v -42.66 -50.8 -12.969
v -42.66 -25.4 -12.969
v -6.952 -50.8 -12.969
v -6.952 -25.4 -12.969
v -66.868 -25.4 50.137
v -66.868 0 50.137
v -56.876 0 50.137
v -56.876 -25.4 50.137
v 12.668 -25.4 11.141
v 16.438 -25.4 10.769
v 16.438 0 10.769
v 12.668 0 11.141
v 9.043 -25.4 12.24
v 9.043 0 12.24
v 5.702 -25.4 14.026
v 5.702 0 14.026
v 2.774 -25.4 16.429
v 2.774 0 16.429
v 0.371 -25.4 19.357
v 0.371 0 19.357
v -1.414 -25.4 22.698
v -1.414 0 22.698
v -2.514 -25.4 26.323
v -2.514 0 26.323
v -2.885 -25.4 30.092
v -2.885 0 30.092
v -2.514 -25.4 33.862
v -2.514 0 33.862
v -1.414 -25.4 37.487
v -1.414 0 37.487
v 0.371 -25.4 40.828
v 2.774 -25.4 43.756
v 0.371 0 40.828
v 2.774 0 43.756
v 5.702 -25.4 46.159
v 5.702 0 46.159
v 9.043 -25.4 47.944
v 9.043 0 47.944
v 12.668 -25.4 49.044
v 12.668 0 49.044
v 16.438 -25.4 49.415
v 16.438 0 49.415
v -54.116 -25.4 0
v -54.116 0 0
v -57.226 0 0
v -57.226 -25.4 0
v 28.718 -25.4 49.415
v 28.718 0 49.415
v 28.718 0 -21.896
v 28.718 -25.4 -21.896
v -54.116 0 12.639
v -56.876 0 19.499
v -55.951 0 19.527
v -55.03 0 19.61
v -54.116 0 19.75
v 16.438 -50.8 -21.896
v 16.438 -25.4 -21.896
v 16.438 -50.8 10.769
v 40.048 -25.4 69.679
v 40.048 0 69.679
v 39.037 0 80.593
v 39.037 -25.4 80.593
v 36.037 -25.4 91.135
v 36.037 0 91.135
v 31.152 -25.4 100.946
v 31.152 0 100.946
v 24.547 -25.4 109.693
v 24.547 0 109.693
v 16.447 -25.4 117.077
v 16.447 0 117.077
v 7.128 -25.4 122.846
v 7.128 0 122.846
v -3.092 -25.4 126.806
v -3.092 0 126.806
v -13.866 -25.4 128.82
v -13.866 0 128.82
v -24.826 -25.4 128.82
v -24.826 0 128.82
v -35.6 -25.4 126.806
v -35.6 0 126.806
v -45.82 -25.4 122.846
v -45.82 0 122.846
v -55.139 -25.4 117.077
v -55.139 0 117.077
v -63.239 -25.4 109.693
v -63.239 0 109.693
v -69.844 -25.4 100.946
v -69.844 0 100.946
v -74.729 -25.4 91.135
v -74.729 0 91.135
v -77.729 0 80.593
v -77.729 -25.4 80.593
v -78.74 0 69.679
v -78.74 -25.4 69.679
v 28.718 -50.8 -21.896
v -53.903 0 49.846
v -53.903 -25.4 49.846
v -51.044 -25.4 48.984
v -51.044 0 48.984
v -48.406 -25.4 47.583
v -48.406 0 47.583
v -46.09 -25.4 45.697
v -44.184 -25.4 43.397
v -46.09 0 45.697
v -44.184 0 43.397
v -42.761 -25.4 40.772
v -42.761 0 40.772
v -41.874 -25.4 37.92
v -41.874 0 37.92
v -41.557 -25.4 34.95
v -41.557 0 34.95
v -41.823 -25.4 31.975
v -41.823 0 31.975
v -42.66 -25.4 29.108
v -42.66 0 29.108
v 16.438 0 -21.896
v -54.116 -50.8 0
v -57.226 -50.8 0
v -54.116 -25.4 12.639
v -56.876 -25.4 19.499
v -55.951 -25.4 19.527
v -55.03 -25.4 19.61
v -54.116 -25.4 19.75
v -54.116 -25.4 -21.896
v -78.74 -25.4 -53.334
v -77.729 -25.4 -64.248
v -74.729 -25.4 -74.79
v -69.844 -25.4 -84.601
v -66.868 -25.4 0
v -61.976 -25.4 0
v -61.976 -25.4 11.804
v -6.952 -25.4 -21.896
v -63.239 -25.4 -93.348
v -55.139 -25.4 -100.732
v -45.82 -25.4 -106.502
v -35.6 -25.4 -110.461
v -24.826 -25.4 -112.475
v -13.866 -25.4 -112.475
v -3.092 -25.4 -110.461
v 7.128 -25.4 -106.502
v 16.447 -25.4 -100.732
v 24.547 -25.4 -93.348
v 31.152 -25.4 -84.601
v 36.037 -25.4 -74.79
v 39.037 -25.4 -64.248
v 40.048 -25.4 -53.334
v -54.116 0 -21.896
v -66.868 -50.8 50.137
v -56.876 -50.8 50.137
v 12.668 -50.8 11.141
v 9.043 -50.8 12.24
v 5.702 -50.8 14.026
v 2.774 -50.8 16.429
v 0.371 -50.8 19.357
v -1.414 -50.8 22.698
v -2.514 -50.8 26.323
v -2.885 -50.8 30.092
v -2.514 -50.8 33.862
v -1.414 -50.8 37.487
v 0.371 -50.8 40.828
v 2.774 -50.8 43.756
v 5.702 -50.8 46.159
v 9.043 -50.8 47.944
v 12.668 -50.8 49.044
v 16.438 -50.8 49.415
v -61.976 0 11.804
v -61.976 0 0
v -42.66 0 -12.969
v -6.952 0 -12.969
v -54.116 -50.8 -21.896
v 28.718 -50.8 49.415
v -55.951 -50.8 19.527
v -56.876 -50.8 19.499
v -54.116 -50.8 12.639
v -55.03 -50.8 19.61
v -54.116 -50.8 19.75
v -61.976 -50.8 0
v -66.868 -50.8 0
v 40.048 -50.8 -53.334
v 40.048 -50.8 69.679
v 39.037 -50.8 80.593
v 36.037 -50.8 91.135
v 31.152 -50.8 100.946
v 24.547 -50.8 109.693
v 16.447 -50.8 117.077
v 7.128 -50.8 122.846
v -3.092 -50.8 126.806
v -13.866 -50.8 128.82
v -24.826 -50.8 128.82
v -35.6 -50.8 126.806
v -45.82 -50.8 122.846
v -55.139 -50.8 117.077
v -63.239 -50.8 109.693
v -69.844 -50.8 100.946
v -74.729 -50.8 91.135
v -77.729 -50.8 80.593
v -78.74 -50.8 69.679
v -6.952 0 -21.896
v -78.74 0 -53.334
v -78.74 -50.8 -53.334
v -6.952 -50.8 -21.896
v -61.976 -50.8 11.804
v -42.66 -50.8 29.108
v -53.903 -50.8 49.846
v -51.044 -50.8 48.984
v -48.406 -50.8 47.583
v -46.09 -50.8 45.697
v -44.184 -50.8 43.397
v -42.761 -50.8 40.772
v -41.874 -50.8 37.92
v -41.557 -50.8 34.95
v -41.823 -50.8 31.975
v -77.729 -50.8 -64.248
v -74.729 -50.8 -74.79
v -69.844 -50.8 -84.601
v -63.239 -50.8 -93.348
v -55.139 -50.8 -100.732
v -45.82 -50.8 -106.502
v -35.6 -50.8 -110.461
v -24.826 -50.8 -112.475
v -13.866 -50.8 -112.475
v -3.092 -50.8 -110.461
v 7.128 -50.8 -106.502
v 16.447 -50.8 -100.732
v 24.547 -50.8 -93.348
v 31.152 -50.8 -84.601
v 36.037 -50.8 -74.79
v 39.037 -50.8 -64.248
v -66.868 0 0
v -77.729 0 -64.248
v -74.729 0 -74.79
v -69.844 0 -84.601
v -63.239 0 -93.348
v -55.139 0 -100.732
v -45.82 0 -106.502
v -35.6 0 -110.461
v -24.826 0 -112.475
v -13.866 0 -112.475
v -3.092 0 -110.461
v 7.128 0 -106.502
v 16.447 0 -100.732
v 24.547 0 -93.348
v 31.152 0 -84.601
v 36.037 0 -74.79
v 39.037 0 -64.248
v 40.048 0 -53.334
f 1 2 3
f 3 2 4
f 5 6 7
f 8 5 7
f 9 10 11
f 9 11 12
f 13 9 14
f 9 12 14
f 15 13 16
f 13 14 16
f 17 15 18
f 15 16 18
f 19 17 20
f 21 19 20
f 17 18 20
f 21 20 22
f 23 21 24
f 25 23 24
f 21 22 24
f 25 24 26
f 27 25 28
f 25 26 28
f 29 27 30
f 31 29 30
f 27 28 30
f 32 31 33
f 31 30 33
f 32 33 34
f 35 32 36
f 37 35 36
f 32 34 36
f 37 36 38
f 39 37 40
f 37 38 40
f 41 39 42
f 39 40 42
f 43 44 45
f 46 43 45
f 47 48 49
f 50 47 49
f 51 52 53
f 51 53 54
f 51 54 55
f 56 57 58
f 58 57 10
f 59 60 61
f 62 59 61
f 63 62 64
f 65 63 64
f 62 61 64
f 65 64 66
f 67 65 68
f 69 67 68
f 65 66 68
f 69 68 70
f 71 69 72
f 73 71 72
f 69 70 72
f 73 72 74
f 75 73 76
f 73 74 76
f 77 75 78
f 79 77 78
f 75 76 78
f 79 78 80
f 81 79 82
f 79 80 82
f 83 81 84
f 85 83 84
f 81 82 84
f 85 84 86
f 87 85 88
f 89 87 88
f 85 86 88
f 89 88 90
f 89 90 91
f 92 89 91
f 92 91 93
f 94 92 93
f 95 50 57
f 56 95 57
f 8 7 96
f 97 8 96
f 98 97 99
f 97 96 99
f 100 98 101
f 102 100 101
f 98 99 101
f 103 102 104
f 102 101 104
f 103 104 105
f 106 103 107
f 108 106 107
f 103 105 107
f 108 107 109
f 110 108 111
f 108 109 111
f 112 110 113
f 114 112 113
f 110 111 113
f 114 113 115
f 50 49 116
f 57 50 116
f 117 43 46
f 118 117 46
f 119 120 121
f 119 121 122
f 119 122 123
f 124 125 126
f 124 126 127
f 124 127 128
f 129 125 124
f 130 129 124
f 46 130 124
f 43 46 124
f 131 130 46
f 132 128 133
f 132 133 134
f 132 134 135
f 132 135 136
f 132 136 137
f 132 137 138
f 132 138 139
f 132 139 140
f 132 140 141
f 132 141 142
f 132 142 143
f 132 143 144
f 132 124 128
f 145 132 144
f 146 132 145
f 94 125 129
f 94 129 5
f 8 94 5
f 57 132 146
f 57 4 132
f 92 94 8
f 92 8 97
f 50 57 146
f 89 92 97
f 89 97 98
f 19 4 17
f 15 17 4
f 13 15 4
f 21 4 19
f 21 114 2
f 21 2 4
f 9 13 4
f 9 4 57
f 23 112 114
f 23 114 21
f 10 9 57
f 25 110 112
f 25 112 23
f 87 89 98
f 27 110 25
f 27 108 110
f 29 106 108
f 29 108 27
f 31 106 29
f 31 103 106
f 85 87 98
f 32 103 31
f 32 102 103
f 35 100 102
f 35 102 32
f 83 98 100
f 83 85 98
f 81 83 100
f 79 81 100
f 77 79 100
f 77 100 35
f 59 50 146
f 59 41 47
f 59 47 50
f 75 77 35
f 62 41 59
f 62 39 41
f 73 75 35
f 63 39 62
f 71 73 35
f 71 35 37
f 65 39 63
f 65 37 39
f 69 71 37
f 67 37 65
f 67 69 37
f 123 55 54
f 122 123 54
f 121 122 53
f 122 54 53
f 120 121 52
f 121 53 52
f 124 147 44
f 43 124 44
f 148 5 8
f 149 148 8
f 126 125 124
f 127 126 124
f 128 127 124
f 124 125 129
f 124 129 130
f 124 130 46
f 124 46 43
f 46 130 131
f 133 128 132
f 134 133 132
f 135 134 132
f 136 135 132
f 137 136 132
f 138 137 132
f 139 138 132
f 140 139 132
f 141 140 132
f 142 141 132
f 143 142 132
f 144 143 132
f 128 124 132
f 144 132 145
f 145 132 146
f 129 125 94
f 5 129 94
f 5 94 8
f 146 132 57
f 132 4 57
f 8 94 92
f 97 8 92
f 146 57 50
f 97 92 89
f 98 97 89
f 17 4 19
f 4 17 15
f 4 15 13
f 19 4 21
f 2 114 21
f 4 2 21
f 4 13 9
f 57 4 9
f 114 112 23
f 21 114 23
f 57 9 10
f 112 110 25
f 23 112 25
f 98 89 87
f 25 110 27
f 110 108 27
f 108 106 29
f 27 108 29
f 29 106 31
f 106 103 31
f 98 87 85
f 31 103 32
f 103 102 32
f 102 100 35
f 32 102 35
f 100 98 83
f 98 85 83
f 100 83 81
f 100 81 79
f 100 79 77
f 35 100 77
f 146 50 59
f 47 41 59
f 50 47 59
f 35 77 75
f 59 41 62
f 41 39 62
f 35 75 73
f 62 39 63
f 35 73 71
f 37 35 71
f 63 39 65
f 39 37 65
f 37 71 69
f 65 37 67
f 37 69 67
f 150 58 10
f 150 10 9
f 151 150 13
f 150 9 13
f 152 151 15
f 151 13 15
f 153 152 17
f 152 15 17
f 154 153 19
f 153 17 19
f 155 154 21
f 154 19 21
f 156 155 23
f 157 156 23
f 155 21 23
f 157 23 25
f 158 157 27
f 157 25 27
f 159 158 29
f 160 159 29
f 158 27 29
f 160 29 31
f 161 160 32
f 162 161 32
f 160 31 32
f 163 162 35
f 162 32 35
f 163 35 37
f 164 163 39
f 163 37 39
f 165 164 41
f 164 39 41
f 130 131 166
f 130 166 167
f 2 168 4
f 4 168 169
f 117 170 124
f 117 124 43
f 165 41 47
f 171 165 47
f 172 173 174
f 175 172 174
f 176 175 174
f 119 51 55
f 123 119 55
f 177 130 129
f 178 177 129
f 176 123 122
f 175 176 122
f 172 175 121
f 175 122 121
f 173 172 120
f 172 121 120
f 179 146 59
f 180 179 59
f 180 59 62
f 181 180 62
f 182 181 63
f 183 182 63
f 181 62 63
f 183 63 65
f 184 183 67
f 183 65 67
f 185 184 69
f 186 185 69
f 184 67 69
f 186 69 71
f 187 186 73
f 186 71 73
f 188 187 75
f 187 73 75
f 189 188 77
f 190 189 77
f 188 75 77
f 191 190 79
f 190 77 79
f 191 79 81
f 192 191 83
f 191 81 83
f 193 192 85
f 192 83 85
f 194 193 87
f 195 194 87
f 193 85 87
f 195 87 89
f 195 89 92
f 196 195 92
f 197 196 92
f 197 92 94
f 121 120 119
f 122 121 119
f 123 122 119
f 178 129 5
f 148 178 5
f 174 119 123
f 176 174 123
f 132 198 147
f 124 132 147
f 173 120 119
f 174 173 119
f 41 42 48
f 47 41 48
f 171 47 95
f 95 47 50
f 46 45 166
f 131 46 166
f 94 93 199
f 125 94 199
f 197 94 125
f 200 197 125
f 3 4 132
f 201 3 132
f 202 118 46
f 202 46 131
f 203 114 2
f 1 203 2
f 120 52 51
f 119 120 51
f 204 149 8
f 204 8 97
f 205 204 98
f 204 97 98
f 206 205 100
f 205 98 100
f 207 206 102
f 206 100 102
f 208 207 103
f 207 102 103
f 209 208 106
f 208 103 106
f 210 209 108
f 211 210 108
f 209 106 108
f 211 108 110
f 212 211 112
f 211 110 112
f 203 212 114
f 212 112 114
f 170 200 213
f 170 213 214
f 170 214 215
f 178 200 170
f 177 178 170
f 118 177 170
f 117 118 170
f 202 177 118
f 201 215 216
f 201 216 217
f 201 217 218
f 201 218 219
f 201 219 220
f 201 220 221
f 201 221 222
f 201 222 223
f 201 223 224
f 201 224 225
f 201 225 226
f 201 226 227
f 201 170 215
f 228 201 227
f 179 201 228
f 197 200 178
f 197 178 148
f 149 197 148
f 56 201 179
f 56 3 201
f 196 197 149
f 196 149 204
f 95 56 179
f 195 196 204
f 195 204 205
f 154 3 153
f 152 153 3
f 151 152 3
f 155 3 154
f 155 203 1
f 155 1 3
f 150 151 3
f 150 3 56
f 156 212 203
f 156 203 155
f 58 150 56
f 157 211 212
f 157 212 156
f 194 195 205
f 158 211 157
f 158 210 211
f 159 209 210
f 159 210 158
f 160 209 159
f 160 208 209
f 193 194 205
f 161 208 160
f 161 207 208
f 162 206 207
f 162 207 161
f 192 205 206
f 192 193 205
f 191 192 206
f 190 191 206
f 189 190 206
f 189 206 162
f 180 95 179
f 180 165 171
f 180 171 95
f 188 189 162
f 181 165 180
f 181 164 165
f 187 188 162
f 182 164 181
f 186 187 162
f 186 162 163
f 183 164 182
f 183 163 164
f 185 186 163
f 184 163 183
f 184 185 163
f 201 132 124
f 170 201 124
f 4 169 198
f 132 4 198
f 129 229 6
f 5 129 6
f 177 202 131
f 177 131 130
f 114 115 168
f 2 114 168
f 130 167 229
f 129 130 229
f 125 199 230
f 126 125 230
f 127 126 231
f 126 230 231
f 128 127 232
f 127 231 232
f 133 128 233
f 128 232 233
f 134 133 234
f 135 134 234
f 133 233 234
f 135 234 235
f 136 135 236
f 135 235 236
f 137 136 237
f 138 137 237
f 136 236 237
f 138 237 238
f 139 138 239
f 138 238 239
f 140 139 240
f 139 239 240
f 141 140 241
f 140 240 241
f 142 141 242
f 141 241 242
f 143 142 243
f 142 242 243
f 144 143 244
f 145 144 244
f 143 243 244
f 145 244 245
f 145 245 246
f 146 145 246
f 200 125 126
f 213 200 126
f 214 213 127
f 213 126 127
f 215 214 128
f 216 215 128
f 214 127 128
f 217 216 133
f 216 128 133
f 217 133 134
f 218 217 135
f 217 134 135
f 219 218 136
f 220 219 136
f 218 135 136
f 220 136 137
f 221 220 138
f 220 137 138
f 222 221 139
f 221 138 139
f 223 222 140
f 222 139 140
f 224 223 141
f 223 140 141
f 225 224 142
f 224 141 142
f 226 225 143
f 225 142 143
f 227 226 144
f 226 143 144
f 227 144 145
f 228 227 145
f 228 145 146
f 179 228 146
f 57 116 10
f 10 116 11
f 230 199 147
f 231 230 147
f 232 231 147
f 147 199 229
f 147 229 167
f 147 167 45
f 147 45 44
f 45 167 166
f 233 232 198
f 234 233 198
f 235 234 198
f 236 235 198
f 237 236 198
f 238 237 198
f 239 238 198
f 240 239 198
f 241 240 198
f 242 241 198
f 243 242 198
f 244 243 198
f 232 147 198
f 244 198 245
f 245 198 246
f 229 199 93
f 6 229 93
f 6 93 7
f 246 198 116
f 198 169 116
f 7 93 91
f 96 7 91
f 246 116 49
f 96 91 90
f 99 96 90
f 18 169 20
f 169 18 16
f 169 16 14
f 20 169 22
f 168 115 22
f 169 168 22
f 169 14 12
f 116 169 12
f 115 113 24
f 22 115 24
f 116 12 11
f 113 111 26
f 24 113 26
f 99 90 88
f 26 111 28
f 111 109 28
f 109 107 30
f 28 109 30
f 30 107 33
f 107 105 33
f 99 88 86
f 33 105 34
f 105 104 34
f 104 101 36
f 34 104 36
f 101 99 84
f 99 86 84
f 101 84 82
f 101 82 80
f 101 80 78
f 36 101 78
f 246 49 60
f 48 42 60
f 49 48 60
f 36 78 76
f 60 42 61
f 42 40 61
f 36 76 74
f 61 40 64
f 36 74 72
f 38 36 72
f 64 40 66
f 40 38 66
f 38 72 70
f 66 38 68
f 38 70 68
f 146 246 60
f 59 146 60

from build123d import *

# Parameters (mm, degrees)
F1_DEPTH = 25.4
F2_DEPTH = 25.4


with BuildPart() as f1:
    # F0 (on Front) → F1 (new body)
    with BuildSketch(Plane.XZ):
        with BuildLine():
            ThreePointArc((40.048032999, 69.6791410446), (-19.34594661, 129.0731206536), (-78.739926219, 69.6791410446))
            Line((-78.739926219, 69.6791410446), (-78.739926219, -53.3344708383))
            ThreePointArc((-78.739926219, -53.3344708383), (-19.34594661, -112.7284504473), (40.048032999, -53.3344708383))
            Line((40.048032999, -53.3344708383), (40.048032999, 69.6791410446))
        make_face()
        with BuildLine():
            Line((-54.1156261476, -21.8957141042), (-54.1156261476, 0))
            Line((-54.1156261476, 0), (-57.2257004678, 0))
            Line((-57.2257004678, 0), (-61.9756149655, 11.8043959837))
            Line((-61.9756149655, 11.8043959837), (-61.9756149655, 0))
            Line((-61.9756149655, 0), (-66.8679773808, 0))
            Line((-66.8679773808, 0), (-66.8679773808, 50.137385726))
            Line((-66.8679773808, 50.137385726), (-56.875812501, 50.137385726))
            ThreePointArc((-56.875812501, 50.137385726), (-44.1841953971, 43.3973306341), (-42.660497129, 29.1080398561))
            Line((-42.660497129, 29.1080398561), (-42.660497129, -12.968535535))
            Line((-42.660497129, -12.968535535), (-6.9517805241, -12.968535535))
            Line((-6.9517805241, -12.968535535), (-6.9517805241, -21.8957141042))
            Line((-6.9517805241, -21.8957141042), (-54.1156261476, -21.8957141042))
        make_face(mode=Mode.SUBTRACT)
        with BuildLine():
            ThreePointArc((16.4377391338, 10.7693783939), (-2.8852429241, 30.0923604518), (16.4377391338, 49.4153425097))
            Line((16.4377391338, 49.4153425097), (28.7177674472, 49.4153425097))
            Line((28.7177674472, 49.4153425097), (28.7177674472, -21.8957141042))
            Line((28.7177674472, -21.8957141042), (16.4377391338, -21.8957141042))
            Line((16.4377391338, -21.8957141042), (16.4377391338, 10.7693783939))
        make_face(mode=Mode.SUBTRACT)
    extrude(amount=F1_DEPTH)


with BuildPart() as f1b:
    # F0 (on Front) → F1, piece 2 (new body)
    with BuildSketch(Plane.XZ):
        with BuildLine():
            ThreePointArc((-54.1156261476, 19.7495529496), (-55.4900378278, 19.5616468515), (-56.875812501, 19.4988398184))
            Line((-56.875812501, 19.4988398184), (-54.1156261476, 12.6392778789))
            Line((-54.1156261476, 12.6392778789), (-54.1156261476, 19.7495529496))
        make_face()
    extrude(amount=F1_DEPTH)


with BuildPart() as f2:
    # F2 (new): a face of the model
    f2_faces = [f1.part.faces().sort_by_distance(p)[0] for p in [
        (-19.4720318388, -25.4, 7.0988838497),
    ]]
    extrude(f2_faces, amount=F2_DEPTH)


with BuildPart() as f2b:
    # F2#2 (new): a face of the model
    f2_2_faces = [f1b.part.faces().sort_by_distance(p)[0] for p in [
        (-55.0302076674, -25.4, 17.2683137212),
    ]]
    extrude(f2_2_faces, amount=F2_DEPTH)


solid = Compound([f1.part, f1b.part, f2.part, f2b.part])
